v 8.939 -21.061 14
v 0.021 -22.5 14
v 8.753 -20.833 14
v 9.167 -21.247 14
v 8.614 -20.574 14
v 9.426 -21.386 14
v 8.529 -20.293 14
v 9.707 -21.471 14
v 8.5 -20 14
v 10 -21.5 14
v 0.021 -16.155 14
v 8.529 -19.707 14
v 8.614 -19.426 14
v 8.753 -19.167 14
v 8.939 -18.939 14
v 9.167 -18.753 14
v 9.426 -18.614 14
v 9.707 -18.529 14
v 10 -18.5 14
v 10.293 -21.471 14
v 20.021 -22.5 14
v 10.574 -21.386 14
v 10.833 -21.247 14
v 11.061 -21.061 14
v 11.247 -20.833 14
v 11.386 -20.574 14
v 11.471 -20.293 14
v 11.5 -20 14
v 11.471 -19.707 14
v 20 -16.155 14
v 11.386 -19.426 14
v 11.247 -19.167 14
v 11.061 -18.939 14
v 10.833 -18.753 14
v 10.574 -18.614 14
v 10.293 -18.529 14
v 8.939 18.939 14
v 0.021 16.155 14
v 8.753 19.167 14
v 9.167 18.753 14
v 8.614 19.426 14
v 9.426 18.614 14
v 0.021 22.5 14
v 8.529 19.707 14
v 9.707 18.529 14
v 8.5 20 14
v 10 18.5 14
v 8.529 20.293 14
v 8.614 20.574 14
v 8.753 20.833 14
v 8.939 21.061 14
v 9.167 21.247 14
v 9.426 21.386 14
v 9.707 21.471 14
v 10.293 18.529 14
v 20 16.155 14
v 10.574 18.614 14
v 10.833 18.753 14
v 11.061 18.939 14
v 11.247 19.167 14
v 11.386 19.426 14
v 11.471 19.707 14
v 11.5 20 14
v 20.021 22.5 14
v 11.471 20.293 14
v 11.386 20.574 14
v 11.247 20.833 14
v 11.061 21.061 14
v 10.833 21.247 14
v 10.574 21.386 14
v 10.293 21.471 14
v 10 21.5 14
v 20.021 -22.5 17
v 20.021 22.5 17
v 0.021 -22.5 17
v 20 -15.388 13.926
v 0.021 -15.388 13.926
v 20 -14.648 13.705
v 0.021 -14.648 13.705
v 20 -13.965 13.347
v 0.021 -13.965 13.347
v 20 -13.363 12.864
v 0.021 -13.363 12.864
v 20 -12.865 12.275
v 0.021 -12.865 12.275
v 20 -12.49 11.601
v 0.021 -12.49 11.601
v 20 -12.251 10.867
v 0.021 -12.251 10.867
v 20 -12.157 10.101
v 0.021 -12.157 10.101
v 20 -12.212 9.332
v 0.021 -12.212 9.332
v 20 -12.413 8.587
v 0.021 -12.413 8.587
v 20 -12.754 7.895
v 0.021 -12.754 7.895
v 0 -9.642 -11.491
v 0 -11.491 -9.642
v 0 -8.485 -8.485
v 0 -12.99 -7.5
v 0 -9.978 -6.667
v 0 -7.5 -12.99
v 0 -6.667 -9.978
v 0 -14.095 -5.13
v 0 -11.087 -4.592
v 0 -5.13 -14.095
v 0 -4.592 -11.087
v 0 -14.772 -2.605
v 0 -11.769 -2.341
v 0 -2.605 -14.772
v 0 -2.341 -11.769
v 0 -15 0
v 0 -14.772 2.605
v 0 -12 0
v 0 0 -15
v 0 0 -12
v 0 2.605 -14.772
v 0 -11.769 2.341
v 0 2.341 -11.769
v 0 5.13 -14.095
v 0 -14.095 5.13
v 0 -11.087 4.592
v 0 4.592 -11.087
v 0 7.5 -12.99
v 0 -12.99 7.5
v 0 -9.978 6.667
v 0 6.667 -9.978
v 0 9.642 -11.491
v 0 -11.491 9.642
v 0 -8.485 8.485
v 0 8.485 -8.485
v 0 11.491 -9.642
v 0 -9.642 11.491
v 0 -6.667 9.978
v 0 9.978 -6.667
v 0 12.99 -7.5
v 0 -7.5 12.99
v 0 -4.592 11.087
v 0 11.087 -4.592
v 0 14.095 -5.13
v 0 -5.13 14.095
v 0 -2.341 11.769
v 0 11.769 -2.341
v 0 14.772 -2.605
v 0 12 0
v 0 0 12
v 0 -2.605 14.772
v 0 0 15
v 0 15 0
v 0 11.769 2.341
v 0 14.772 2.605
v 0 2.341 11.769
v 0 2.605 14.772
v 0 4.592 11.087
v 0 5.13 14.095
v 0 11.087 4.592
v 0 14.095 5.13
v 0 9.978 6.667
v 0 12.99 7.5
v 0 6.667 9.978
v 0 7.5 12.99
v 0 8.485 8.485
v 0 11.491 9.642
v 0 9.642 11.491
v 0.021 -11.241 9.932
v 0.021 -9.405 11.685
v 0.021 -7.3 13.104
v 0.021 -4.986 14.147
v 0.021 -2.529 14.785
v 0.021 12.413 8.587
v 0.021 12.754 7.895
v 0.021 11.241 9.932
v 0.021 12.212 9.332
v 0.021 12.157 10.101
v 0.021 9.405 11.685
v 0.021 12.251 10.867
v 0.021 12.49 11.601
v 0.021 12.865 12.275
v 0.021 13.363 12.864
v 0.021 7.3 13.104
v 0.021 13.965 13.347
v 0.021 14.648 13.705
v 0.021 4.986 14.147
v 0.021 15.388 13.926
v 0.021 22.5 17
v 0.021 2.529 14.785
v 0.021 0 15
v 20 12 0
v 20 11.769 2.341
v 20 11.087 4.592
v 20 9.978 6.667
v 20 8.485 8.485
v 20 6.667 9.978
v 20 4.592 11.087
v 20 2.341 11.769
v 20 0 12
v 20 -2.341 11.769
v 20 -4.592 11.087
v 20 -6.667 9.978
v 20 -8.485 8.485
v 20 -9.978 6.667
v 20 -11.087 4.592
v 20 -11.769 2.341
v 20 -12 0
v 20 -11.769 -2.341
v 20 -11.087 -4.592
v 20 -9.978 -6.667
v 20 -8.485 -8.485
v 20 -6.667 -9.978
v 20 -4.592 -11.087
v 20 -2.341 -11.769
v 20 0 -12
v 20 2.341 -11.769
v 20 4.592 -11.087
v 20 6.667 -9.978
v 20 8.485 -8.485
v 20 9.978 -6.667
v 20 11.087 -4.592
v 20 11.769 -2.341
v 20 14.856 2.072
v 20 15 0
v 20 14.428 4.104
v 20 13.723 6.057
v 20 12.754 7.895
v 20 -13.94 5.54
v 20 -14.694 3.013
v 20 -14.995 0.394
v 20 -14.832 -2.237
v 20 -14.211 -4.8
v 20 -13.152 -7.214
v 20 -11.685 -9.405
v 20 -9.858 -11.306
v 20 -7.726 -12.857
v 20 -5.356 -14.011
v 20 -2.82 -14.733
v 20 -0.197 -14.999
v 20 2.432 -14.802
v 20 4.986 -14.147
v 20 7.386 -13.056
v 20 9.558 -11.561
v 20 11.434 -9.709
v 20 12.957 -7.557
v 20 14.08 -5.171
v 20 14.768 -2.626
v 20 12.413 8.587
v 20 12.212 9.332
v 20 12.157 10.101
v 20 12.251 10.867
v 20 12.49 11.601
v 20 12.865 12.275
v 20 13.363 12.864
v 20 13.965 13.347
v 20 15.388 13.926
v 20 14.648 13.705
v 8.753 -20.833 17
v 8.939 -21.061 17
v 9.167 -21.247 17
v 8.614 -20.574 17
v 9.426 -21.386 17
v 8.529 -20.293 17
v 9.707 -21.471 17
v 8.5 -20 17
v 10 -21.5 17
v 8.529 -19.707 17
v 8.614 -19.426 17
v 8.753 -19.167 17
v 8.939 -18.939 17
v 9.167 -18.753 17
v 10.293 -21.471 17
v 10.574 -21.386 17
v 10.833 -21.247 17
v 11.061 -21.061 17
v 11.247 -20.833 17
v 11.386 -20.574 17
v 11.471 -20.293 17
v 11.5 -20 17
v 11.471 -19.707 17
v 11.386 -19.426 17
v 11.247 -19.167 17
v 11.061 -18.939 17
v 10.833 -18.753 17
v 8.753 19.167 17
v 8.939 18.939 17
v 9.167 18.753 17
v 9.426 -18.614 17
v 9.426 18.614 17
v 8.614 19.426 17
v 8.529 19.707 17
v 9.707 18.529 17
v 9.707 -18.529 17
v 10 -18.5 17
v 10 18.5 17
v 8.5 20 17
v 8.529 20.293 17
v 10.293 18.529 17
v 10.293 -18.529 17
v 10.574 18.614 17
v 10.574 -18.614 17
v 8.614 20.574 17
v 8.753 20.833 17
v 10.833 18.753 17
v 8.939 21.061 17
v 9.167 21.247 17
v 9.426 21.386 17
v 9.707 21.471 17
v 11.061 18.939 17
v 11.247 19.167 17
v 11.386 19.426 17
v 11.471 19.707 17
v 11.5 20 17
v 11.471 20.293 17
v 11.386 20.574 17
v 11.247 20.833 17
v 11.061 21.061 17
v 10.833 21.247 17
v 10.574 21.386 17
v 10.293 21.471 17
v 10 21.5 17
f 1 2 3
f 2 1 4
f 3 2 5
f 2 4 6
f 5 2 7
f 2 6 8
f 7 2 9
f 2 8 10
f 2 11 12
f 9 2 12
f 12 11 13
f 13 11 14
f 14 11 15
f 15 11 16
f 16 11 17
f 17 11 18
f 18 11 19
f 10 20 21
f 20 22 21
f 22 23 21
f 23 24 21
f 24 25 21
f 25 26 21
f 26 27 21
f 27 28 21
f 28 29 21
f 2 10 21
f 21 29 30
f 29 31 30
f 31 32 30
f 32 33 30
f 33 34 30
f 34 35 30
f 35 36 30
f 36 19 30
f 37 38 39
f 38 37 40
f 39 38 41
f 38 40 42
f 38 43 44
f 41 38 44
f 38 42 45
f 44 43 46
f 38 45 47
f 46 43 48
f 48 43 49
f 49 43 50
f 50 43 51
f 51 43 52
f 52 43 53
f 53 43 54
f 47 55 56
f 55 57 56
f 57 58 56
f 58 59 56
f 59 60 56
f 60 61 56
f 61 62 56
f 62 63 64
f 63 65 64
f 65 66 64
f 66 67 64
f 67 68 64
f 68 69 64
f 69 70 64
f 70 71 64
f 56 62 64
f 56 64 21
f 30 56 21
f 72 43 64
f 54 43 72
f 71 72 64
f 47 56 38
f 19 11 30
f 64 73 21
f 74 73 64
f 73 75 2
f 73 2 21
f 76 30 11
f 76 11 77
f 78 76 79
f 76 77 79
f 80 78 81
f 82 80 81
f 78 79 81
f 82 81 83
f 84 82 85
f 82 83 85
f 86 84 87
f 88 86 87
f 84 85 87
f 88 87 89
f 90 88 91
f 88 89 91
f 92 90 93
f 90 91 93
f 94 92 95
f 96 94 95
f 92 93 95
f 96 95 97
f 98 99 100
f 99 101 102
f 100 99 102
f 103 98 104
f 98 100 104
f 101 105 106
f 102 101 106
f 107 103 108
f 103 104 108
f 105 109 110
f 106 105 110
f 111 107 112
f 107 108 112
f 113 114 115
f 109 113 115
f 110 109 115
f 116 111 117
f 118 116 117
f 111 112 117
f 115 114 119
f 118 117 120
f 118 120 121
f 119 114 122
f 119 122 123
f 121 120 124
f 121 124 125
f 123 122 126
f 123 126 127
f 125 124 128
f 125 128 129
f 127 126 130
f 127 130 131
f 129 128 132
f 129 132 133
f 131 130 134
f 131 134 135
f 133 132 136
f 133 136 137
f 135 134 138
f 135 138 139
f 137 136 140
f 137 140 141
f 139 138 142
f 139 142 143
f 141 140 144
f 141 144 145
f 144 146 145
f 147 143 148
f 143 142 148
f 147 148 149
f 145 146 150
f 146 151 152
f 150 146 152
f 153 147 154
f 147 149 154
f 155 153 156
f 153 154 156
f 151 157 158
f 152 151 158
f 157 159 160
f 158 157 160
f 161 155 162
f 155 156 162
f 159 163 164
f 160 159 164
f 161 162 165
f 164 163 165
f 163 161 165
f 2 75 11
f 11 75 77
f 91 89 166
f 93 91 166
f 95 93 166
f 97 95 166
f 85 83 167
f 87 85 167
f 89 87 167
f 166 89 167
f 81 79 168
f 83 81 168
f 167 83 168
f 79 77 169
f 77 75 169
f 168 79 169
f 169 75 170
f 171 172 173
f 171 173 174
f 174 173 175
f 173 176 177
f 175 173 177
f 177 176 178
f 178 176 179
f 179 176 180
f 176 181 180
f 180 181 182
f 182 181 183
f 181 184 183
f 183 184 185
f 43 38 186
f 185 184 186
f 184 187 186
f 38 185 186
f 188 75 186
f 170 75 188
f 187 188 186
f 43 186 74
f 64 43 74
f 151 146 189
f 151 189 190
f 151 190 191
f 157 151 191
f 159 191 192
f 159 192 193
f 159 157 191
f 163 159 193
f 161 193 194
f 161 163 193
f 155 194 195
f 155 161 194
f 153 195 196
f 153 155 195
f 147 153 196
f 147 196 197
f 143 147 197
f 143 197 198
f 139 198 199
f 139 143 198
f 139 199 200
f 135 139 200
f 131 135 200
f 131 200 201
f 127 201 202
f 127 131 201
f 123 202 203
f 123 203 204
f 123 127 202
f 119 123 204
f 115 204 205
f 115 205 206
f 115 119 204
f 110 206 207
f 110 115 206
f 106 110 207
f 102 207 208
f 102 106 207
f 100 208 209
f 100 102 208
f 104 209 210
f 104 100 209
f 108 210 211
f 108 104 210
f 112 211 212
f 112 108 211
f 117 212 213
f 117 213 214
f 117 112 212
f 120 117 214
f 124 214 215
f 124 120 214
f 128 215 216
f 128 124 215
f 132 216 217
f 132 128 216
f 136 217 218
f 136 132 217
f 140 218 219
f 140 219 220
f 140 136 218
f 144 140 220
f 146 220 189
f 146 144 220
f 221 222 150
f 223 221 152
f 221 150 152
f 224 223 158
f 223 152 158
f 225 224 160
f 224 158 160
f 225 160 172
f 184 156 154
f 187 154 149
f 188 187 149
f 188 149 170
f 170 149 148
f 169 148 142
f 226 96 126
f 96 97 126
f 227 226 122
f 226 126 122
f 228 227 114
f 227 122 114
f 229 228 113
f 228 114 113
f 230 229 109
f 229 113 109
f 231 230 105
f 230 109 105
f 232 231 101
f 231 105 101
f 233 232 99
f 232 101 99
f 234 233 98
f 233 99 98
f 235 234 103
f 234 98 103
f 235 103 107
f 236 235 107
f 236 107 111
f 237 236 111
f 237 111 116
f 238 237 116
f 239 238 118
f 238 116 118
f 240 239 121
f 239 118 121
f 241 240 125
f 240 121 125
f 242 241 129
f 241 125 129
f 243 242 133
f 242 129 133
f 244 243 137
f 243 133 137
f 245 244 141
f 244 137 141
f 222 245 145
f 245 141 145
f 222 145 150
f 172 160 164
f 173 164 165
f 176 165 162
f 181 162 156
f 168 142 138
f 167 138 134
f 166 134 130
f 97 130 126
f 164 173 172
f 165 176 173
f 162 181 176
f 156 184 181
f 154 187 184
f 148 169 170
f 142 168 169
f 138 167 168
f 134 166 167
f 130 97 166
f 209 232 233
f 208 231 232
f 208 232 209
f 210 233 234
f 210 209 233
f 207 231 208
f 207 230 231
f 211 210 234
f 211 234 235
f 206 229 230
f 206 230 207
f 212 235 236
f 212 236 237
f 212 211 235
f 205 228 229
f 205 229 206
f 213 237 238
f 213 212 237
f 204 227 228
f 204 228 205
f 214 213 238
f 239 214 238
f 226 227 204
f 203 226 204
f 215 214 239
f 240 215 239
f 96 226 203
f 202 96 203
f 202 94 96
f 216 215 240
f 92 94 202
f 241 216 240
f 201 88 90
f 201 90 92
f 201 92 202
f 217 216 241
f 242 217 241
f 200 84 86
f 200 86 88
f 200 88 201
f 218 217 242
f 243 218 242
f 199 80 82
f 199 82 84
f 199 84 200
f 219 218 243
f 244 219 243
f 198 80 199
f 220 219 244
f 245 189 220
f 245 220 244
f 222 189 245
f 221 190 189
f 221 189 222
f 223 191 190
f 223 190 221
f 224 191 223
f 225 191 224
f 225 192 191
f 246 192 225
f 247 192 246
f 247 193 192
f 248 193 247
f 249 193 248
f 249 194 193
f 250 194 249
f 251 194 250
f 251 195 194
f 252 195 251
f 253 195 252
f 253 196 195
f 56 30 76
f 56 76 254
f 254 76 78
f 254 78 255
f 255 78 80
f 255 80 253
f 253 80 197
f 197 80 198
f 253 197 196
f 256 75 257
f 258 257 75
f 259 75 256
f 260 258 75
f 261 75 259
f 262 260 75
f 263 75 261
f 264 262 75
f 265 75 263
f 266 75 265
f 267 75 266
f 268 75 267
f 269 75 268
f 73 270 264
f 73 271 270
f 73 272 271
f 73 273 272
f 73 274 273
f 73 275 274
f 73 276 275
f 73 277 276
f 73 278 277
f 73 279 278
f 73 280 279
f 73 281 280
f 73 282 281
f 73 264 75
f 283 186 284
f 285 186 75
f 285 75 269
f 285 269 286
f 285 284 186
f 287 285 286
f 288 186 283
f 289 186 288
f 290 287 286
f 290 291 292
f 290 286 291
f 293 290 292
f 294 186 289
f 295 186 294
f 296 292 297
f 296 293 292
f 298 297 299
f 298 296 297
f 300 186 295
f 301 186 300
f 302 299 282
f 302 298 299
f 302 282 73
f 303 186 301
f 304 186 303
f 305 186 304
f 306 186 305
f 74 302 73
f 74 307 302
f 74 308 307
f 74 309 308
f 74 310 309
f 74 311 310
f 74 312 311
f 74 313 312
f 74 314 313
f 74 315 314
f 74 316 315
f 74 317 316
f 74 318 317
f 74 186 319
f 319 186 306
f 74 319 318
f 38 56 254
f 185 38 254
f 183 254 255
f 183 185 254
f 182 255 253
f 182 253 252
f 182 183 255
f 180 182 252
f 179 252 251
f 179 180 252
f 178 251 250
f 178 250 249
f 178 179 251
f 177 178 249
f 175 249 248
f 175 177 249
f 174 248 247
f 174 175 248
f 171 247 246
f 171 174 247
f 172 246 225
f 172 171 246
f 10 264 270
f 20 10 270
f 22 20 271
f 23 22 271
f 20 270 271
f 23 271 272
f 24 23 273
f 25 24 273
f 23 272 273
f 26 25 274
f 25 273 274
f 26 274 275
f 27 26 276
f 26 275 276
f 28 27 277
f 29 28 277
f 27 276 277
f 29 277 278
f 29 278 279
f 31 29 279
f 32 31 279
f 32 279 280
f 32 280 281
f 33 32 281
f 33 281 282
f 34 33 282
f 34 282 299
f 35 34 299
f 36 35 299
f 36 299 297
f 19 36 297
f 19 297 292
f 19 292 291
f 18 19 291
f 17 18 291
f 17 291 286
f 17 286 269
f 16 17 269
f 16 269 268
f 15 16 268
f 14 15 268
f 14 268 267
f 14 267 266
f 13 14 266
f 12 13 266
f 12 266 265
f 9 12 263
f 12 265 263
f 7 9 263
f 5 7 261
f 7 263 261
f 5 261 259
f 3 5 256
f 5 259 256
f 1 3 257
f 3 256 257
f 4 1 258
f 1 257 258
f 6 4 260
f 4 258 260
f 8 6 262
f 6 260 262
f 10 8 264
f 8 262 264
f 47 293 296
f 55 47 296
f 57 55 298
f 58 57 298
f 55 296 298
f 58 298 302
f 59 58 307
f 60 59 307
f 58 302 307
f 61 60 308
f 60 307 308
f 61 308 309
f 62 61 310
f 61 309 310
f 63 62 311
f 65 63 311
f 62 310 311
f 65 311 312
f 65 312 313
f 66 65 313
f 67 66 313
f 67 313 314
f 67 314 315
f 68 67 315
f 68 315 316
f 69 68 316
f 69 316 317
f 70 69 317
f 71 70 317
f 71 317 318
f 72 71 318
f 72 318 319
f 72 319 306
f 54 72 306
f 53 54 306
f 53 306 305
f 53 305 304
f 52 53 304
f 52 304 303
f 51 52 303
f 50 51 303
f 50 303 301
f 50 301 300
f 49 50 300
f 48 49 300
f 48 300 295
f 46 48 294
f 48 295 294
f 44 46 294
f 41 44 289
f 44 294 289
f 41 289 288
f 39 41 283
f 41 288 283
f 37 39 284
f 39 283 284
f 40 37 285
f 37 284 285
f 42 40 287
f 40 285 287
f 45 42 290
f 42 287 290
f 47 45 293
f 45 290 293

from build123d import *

# Parameters (mm, degrees)
SKETCH_R     = 15
SKETCH_R_2   = 12
PAD_DEPTH    = 20
SKETCH001_W  = 20
SKETCH001_H  = 45
PAD001_DEPTH = 3
SKETCH002_R  = 1.5
POCKET_DEPTH = 5
FILLET_R     = 4


with BuildPart() as part:
    # Sketch → Pad (new body)
    with BuildSketch(Plane.YZ):
        Circle(SKETCH_R)
        Circle(SKETCH_R_2, mode=Mode.SUBTRACT)
    extrude(amount=PAD_DEPTH)

    # Sketch001 (on DatumPlane) → Pad001 (join)
    with BuildSketch(Plane.XY.offset(17)):
        with Locations((10.021344, 0)):
            Rectangle(SKETCH001_W, SKETCH001_H)
    extrude(amount=-PAD001_DEPTH)

    # Sketch002 (on Face10 of Pad001) → Pocket (cut)
    with BuildSketch(Plane(origin=(0, 0, 17), x_dir=(0, -1, 0), z_dir=(0, 0, 1))):
        with Locations((-20, 10)):
            Circle(SKETCH002_R)
        with Locations((20, 10)):
            Circle(SKETCH002_R)
    extrude(amount=-POCKET_DEPTH, mode=Mode.SUBTRACT)

    # Fillet
    fillet_edges = [part.edges().sort_by_distance(p)[0] for p in [
        (10.010672, -5.385165, 14),
        (10.010672, 5.385165, 14),
    ]]
    fillet(fillet_edges, radius=FILLET_R)


solid = part.part
